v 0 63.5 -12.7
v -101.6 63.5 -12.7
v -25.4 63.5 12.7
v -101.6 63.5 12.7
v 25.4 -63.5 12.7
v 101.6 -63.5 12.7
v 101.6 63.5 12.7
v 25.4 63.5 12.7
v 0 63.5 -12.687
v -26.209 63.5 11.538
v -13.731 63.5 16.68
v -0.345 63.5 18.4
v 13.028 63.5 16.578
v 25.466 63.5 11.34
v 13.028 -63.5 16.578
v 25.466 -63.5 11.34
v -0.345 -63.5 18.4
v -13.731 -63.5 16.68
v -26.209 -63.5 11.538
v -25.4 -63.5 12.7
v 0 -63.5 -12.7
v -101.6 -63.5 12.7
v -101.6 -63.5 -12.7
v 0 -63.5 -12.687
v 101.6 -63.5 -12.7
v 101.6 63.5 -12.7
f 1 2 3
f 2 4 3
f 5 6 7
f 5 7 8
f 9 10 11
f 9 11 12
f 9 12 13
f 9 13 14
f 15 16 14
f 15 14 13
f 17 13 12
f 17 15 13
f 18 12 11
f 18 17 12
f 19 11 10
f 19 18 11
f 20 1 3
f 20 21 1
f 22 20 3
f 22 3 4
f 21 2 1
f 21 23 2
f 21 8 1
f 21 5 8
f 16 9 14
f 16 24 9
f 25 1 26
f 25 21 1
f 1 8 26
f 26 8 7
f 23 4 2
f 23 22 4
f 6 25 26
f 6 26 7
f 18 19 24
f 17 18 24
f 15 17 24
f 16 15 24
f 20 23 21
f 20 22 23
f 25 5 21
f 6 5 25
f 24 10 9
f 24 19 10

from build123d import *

# Parameters (mm, degrees)
F1_DEPTH = 63.5
F3_DEPTH = 63.5


with BuildPart() as f1:
    # F0 (on Front) → F1 (new body, symmetric)
    with BuildSketch(Plane.XZ):
        Polygon((-101.6, -12.7), (0, -12.7), (-25.4, 12.7), (-101.6, 12.7), align=None)
        Polygon((0, -12.7), (101.6, -12.7), (101.6, 12.7), (25.4, 12.7), align=None)
    extrude(amount=F1_DEPTH, both=True)


with BuildPart() as f3:
    # F2 (on Front) → F3 (new body, symmetric)
    with BuildSketch(Plane.XZ):
        with BuildLine():
            Line((0, -12.686771), (25.466047, 11.340428))
            ThreePointArc((25.466047, 11.340428), (-0.344855, 18.39957), (-26.209088, 11.5384))
            Line((-26.209088, 11.5384), (0, -12.686771))
        make_face()
    extrude(amount=F3_DEPTH, both=True)


solid = Compound([f1.part, f3.part])
